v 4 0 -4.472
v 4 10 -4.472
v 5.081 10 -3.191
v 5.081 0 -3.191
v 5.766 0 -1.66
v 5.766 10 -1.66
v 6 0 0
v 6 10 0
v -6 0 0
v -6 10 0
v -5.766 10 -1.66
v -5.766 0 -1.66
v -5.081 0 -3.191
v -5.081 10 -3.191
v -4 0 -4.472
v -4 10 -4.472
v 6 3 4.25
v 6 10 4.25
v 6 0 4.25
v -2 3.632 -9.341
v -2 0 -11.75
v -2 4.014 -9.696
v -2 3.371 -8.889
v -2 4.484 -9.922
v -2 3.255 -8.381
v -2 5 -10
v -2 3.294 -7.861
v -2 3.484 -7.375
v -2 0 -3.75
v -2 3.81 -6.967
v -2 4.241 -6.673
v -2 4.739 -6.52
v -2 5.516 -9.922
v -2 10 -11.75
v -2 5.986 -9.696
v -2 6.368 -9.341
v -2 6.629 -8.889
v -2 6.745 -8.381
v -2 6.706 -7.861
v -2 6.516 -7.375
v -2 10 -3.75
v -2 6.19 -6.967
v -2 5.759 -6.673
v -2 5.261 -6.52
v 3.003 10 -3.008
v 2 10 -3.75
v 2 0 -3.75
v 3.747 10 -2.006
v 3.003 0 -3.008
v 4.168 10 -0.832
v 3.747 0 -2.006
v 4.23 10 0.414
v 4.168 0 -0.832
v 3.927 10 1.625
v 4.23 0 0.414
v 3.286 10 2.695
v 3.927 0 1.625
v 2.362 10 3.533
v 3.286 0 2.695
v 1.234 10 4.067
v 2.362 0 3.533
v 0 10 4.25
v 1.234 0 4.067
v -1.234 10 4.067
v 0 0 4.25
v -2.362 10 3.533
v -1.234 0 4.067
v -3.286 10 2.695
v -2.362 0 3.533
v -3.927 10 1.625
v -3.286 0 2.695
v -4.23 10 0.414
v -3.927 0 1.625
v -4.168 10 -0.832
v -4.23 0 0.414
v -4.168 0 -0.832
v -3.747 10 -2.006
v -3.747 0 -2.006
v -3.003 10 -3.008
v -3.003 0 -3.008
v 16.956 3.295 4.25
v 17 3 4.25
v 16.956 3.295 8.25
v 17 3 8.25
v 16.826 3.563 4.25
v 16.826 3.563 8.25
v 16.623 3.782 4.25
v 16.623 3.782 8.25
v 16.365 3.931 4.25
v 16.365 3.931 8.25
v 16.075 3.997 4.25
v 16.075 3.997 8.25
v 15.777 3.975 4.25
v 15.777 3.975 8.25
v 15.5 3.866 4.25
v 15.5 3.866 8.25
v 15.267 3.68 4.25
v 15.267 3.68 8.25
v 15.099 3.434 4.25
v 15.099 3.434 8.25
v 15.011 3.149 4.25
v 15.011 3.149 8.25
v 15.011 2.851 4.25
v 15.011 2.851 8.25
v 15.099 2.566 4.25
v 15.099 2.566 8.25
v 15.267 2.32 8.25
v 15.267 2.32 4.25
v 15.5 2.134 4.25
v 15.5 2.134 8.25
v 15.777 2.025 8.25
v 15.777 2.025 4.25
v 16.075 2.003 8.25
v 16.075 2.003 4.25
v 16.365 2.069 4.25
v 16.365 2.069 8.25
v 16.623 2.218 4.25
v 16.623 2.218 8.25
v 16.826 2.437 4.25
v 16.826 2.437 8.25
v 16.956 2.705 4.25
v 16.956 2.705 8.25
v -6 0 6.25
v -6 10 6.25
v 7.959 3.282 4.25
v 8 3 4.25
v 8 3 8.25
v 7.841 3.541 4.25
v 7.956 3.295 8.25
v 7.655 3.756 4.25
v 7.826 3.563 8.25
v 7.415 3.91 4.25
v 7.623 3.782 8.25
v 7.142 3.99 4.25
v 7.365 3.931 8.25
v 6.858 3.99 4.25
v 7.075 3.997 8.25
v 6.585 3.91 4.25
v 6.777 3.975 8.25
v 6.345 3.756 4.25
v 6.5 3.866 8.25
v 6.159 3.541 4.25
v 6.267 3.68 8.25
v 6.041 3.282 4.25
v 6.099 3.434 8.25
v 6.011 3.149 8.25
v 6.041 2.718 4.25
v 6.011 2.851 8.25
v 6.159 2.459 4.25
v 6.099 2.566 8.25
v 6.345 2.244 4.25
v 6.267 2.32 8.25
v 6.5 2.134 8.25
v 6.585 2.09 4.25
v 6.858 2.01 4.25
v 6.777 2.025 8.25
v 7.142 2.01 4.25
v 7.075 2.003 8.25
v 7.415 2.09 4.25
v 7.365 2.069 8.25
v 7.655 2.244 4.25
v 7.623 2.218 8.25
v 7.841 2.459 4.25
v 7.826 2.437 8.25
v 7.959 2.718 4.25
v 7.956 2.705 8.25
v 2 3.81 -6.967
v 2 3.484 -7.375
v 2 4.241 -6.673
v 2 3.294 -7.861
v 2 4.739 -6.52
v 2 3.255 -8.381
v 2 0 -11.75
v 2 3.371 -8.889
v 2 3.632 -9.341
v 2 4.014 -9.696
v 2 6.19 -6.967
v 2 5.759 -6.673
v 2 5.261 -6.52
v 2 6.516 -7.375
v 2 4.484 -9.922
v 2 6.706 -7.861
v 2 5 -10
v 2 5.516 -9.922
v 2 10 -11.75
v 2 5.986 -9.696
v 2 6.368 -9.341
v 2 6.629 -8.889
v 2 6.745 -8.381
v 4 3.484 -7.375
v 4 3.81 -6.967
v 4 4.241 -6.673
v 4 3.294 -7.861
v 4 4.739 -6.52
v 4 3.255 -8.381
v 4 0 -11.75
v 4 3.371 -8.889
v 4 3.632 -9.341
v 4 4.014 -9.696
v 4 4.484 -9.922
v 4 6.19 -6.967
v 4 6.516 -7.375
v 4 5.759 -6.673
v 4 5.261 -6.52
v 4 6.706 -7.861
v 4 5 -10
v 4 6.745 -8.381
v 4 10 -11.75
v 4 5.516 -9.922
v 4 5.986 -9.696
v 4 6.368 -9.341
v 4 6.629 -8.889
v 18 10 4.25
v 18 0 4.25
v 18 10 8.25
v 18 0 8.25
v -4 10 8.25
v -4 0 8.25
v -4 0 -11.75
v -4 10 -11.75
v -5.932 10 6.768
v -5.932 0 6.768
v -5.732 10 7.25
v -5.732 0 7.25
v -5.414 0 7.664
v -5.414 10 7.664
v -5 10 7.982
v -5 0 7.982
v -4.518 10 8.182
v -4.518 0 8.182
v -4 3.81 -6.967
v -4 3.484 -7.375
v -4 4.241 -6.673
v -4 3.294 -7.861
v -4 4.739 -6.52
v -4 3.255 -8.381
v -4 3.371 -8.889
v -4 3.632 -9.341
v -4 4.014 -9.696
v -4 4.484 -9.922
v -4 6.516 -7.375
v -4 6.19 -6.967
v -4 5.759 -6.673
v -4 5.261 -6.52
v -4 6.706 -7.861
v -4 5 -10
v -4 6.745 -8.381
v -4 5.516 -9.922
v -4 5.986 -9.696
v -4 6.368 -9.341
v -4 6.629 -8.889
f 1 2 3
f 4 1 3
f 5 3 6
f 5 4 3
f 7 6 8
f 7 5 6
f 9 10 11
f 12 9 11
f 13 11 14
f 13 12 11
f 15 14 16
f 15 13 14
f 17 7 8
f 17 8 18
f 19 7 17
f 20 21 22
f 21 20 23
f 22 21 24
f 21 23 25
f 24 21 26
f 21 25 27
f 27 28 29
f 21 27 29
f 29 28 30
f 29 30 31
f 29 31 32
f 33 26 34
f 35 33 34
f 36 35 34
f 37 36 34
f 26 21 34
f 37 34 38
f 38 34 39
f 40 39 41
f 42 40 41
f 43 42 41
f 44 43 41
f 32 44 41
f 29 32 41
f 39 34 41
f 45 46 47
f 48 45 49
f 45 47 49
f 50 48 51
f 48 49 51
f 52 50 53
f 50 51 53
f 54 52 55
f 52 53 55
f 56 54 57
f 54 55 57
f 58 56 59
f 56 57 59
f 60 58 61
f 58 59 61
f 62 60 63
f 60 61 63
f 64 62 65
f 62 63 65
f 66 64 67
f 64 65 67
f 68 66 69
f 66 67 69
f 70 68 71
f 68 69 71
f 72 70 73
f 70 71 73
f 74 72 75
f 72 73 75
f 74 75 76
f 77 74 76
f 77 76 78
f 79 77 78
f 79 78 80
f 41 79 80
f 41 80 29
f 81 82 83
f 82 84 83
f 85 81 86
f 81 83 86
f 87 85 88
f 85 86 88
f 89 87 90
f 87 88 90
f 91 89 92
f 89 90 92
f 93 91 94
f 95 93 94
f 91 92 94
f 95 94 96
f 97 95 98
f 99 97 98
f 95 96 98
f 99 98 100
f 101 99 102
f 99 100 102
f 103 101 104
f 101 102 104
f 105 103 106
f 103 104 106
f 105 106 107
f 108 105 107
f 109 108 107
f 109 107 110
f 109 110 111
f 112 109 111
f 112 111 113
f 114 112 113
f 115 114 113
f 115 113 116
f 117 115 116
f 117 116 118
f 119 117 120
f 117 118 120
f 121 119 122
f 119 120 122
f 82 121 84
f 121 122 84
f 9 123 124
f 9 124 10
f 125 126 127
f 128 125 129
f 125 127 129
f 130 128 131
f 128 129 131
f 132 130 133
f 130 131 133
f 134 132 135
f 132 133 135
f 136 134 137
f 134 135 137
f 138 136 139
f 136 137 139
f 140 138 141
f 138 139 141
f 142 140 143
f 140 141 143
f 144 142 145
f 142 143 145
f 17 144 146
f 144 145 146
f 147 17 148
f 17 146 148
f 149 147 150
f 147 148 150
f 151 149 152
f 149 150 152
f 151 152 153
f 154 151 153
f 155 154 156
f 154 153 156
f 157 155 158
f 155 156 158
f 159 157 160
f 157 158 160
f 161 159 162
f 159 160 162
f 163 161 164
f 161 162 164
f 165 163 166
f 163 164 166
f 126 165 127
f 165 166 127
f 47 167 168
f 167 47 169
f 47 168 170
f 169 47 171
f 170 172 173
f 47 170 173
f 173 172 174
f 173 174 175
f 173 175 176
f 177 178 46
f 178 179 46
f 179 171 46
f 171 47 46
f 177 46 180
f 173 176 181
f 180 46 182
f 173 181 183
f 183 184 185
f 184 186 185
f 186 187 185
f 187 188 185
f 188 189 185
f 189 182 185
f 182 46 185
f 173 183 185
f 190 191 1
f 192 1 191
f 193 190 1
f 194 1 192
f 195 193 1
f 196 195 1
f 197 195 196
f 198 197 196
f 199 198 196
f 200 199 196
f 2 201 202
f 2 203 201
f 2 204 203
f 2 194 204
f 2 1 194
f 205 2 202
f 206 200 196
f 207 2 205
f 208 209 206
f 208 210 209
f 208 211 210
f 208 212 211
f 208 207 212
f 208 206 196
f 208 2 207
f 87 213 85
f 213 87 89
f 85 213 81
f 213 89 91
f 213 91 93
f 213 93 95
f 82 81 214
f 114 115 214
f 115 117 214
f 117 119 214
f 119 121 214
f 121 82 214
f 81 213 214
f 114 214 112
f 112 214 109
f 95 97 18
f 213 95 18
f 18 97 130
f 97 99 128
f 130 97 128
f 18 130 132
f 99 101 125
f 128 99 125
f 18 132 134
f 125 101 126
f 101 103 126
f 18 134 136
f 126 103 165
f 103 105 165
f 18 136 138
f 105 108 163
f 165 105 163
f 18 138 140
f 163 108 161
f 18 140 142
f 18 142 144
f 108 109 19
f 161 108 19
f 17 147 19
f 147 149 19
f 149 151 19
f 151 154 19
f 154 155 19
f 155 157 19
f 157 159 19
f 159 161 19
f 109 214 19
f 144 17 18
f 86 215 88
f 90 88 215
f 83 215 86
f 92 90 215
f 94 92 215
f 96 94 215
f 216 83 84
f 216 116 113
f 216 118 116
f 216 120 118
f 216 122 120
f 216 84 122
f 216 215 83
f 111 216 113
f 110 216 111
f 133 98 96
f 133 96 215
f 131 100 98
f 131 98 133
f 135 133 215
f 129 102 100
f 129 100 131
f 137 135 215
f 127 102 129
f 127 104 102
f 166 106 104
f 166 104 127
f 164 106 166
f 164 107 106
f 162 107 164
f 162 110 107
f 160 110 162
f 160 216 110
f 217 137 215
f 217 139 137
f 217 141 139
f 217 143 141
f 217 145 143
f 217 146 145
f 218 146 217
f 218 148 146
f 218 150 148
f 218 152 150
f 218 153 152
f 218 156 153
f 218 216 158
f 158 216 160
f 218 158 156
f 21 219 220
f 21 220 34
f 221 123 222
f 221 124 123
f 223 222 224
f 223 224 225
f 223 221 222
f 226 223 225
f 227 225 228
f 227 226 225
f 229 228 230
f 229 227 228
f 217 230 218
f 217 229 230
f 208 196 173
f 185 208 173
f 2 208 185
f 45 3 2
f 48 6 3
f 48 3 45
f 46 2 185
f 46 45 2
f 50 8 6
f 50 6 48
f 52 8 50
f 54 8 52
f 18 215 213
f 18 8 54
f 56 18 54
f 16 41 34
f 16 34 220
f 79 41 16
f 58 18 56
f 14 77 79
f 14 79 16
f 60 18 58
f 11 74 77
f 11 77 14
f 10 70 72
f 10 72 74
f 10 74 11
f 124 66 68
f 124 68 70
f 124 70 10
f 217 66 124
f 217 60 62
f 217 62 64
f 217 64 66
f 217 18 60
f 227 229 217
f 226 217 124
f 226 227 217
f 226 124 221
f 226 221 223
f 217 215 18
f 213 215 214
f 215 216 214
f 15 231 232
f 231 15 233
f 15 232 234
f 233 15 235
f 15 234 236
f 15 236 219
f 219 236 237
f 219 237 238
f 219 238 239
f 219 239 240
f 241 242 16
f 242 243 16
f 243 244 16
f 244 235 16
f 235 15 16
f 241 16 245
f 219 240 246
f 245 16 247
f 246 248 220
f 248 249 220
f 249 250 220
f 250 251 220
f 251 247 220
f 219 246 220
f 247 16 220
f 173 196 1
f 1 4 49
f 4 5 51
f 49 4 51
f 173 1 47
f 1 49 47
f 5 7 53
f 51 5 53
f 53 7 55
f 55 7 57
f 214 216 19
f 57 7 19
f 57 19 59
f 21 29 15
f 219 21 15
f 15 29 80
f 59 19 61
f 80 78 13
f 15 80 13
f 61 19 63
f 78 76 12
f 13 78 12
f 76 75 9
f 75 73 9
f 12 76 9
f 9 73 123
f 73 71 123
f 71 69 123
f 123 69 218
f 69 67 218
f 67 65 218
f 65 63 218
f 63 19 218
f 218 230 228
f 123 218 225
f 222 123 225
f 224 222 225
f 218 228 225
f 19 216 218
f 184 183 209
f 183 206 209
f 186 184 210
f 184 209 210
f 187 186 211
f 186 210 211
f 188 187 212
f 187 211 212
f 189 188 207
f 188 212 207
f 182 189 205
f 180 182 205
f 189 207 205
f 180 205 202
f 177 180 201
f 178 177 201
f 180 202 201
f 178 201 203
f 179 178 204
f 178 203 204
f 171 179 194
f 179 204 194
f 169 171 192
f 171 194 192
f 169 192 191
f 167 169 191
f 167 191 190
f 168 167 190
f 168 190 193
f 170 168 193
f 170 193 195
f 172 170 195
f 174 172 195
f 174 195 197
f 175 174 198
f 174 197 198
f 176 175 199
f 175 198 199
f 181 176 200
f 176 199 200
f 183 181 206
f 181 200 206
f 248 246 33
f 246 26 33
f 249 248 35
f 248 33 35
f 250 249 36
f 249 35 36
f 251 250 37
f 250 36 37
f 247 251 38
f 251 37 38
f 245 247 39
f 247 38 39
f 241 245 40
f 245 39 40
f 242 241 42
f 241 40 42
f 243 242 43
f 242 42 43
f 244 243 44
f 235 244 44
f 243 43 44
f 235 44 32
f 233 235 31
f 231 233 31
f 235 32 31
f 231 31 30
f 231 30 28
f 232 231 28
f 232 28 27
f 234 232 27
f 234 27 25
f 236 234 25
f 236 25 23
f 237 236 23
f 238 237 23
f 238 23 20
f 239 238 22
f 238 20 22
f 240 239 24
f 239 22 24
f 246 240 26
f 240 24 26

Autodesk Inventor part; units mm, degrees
ref_plane "YZ Plane" through (0, 0, 0) normal (1, 0, 0) x (0, 1, 0)
ref_plane "XZ Plane" through (0, 0, 0) normal (0, 1, 0) x (-1, 0, 0)
ref_plane "XY Plane" through (0, 0, 0) normal (0, 0, 1) x (1, 0, 0)
sketch "Sketch1" plane through (0, 0, 0) normal (0, 1, 0) x (-1, 0, 0)
  circle A0 centre (0, 0) radius 4.25
  circle A1 centre (0, 0) radius 6
  line L0 (6, 0) -> (-6, 0)
  line L1 (-6, 0) -> (-6, 8.25)
  line L2 (-6, 8.25) -> (6, 8.25)
  line L3 (6, 8.25) -> (6, 0)
  line L4 (6, 8.25) -> (-18, 8.25)
  line L5 (-18, 8.25) -> (-18, 4.25)
  line L6 (-18, 4.25) -> (6, 4.25)
  line L7 (6, 4.25) -> (6, 8.25)
  point P0 (-4.2353, 4.25)
  point P1 (4.2353, 4.25)
  point P2 (6, 8.25)
  point P3 (-6, 4.25)
  point P4 (6, 4.25)
  dimension "d1" = 12
  dimension "d0" = 8.5
  dimension "d2" = 4
  dimension "d3" = 6
  dimension "d4" = 18
extrude "Extrusion1" add sketch "Sketch1" along normal blind 10 contours L0 A1 A0 | A0 L6 A1 L0 | A0 L0 A1 L6 | L6 A1 | A1 L6 L3 | L6 L1 L2 L3 A1 | A1 L1 L6 | L6 L5 L4 L1
sketch "Sketch2" plane through (0, 10, 0) normal (0, 1, 0) x (1, 0, 0)
  line L0 (-2, 1.8795) -> (2, 1.8795)
  line L1 (2, 1.8795) -> (2, 9.0075)
  line L2 (2, 9.0075) -> (-2, 9.0075)
  line L3 (-2, 9.0075) -> (-2, 1.8795)
  point P0 (0, 0)
  dimension "d7" = 2
  dimension "d8" = 2
extrude "Extrusion2" cut sketch "Sketch2" against normal blind 10
sketch "Sketch3" plane through (0, 10, 0) normal (0, 1, 0) x (1, 0, 0)
  line L0 (2, 3.75) -> (2, 5.6569) projected
  line L1 (2, 3.75) -> (4, 3.75)
  line L2 (4, 3.75) -> (4, 11.75)
  line L3 (4, 11.75) -> (2, 11.75)
  line L4 (2, 11.75) -> (2, 3.75)
  line L5 (-2, 3.75) -> (-2, 5.6569) projected
  line L6 (-2, 3.75) -> (-4, 3.75)
  line L7 (-4, 3.75) -> (-4, 11.75)
  line L8 (-4, 11.75) -> (-2, 11.75)
  line L9 (-2, 11.75) -> (-2, 3.75)
  point P0 (0, 0)
  dimension "d11" = 2
  dimension "d12" = 2
  dimension "d13" = 8
  dimension "d14" = 8
extrude "Extrusion3" add sketch "Sketch3" against normal blind 10
sketch "Sketch4" plane through (4, 10, -4.4721) normal (1, 0, 0) x (0, 0, -1)
  circle A0 centre (3.7779, -5) radius 1.75
  line L0 (7.2779, 0) -> (7.2779, -10) projected
  point P0 (-4.4721, -10)
  dimension "d17" = 3.5
  dimension "d18" = 3.5
extrude "Extrusion4" cut sketch "Sketch4" against normal through all
sketch "Sketch5" plane through (-6, 0, 8.25) normal (0, 0, 1) x (1, 0, 0)
  circle A0 centre (13, 3) radius 1
  circle A1 centre (22, 3) radius 1
  line L0 (0, 0) -> (0, 10) projected
  line L1 (0, 10) -> (24, 10) projected
  point P0 (6, 0)
  dimension "d21" = 2
  dimension "d22" = 9
  dimension "d24" = 7
  dimension "d27" = 16
extrude "Extrusion5" cut sketch "Sketch5" against normal through all
fillet "Fillet1" radius 2 1 edges at (-6, 5, 8.25)
properties part number "zstop"
